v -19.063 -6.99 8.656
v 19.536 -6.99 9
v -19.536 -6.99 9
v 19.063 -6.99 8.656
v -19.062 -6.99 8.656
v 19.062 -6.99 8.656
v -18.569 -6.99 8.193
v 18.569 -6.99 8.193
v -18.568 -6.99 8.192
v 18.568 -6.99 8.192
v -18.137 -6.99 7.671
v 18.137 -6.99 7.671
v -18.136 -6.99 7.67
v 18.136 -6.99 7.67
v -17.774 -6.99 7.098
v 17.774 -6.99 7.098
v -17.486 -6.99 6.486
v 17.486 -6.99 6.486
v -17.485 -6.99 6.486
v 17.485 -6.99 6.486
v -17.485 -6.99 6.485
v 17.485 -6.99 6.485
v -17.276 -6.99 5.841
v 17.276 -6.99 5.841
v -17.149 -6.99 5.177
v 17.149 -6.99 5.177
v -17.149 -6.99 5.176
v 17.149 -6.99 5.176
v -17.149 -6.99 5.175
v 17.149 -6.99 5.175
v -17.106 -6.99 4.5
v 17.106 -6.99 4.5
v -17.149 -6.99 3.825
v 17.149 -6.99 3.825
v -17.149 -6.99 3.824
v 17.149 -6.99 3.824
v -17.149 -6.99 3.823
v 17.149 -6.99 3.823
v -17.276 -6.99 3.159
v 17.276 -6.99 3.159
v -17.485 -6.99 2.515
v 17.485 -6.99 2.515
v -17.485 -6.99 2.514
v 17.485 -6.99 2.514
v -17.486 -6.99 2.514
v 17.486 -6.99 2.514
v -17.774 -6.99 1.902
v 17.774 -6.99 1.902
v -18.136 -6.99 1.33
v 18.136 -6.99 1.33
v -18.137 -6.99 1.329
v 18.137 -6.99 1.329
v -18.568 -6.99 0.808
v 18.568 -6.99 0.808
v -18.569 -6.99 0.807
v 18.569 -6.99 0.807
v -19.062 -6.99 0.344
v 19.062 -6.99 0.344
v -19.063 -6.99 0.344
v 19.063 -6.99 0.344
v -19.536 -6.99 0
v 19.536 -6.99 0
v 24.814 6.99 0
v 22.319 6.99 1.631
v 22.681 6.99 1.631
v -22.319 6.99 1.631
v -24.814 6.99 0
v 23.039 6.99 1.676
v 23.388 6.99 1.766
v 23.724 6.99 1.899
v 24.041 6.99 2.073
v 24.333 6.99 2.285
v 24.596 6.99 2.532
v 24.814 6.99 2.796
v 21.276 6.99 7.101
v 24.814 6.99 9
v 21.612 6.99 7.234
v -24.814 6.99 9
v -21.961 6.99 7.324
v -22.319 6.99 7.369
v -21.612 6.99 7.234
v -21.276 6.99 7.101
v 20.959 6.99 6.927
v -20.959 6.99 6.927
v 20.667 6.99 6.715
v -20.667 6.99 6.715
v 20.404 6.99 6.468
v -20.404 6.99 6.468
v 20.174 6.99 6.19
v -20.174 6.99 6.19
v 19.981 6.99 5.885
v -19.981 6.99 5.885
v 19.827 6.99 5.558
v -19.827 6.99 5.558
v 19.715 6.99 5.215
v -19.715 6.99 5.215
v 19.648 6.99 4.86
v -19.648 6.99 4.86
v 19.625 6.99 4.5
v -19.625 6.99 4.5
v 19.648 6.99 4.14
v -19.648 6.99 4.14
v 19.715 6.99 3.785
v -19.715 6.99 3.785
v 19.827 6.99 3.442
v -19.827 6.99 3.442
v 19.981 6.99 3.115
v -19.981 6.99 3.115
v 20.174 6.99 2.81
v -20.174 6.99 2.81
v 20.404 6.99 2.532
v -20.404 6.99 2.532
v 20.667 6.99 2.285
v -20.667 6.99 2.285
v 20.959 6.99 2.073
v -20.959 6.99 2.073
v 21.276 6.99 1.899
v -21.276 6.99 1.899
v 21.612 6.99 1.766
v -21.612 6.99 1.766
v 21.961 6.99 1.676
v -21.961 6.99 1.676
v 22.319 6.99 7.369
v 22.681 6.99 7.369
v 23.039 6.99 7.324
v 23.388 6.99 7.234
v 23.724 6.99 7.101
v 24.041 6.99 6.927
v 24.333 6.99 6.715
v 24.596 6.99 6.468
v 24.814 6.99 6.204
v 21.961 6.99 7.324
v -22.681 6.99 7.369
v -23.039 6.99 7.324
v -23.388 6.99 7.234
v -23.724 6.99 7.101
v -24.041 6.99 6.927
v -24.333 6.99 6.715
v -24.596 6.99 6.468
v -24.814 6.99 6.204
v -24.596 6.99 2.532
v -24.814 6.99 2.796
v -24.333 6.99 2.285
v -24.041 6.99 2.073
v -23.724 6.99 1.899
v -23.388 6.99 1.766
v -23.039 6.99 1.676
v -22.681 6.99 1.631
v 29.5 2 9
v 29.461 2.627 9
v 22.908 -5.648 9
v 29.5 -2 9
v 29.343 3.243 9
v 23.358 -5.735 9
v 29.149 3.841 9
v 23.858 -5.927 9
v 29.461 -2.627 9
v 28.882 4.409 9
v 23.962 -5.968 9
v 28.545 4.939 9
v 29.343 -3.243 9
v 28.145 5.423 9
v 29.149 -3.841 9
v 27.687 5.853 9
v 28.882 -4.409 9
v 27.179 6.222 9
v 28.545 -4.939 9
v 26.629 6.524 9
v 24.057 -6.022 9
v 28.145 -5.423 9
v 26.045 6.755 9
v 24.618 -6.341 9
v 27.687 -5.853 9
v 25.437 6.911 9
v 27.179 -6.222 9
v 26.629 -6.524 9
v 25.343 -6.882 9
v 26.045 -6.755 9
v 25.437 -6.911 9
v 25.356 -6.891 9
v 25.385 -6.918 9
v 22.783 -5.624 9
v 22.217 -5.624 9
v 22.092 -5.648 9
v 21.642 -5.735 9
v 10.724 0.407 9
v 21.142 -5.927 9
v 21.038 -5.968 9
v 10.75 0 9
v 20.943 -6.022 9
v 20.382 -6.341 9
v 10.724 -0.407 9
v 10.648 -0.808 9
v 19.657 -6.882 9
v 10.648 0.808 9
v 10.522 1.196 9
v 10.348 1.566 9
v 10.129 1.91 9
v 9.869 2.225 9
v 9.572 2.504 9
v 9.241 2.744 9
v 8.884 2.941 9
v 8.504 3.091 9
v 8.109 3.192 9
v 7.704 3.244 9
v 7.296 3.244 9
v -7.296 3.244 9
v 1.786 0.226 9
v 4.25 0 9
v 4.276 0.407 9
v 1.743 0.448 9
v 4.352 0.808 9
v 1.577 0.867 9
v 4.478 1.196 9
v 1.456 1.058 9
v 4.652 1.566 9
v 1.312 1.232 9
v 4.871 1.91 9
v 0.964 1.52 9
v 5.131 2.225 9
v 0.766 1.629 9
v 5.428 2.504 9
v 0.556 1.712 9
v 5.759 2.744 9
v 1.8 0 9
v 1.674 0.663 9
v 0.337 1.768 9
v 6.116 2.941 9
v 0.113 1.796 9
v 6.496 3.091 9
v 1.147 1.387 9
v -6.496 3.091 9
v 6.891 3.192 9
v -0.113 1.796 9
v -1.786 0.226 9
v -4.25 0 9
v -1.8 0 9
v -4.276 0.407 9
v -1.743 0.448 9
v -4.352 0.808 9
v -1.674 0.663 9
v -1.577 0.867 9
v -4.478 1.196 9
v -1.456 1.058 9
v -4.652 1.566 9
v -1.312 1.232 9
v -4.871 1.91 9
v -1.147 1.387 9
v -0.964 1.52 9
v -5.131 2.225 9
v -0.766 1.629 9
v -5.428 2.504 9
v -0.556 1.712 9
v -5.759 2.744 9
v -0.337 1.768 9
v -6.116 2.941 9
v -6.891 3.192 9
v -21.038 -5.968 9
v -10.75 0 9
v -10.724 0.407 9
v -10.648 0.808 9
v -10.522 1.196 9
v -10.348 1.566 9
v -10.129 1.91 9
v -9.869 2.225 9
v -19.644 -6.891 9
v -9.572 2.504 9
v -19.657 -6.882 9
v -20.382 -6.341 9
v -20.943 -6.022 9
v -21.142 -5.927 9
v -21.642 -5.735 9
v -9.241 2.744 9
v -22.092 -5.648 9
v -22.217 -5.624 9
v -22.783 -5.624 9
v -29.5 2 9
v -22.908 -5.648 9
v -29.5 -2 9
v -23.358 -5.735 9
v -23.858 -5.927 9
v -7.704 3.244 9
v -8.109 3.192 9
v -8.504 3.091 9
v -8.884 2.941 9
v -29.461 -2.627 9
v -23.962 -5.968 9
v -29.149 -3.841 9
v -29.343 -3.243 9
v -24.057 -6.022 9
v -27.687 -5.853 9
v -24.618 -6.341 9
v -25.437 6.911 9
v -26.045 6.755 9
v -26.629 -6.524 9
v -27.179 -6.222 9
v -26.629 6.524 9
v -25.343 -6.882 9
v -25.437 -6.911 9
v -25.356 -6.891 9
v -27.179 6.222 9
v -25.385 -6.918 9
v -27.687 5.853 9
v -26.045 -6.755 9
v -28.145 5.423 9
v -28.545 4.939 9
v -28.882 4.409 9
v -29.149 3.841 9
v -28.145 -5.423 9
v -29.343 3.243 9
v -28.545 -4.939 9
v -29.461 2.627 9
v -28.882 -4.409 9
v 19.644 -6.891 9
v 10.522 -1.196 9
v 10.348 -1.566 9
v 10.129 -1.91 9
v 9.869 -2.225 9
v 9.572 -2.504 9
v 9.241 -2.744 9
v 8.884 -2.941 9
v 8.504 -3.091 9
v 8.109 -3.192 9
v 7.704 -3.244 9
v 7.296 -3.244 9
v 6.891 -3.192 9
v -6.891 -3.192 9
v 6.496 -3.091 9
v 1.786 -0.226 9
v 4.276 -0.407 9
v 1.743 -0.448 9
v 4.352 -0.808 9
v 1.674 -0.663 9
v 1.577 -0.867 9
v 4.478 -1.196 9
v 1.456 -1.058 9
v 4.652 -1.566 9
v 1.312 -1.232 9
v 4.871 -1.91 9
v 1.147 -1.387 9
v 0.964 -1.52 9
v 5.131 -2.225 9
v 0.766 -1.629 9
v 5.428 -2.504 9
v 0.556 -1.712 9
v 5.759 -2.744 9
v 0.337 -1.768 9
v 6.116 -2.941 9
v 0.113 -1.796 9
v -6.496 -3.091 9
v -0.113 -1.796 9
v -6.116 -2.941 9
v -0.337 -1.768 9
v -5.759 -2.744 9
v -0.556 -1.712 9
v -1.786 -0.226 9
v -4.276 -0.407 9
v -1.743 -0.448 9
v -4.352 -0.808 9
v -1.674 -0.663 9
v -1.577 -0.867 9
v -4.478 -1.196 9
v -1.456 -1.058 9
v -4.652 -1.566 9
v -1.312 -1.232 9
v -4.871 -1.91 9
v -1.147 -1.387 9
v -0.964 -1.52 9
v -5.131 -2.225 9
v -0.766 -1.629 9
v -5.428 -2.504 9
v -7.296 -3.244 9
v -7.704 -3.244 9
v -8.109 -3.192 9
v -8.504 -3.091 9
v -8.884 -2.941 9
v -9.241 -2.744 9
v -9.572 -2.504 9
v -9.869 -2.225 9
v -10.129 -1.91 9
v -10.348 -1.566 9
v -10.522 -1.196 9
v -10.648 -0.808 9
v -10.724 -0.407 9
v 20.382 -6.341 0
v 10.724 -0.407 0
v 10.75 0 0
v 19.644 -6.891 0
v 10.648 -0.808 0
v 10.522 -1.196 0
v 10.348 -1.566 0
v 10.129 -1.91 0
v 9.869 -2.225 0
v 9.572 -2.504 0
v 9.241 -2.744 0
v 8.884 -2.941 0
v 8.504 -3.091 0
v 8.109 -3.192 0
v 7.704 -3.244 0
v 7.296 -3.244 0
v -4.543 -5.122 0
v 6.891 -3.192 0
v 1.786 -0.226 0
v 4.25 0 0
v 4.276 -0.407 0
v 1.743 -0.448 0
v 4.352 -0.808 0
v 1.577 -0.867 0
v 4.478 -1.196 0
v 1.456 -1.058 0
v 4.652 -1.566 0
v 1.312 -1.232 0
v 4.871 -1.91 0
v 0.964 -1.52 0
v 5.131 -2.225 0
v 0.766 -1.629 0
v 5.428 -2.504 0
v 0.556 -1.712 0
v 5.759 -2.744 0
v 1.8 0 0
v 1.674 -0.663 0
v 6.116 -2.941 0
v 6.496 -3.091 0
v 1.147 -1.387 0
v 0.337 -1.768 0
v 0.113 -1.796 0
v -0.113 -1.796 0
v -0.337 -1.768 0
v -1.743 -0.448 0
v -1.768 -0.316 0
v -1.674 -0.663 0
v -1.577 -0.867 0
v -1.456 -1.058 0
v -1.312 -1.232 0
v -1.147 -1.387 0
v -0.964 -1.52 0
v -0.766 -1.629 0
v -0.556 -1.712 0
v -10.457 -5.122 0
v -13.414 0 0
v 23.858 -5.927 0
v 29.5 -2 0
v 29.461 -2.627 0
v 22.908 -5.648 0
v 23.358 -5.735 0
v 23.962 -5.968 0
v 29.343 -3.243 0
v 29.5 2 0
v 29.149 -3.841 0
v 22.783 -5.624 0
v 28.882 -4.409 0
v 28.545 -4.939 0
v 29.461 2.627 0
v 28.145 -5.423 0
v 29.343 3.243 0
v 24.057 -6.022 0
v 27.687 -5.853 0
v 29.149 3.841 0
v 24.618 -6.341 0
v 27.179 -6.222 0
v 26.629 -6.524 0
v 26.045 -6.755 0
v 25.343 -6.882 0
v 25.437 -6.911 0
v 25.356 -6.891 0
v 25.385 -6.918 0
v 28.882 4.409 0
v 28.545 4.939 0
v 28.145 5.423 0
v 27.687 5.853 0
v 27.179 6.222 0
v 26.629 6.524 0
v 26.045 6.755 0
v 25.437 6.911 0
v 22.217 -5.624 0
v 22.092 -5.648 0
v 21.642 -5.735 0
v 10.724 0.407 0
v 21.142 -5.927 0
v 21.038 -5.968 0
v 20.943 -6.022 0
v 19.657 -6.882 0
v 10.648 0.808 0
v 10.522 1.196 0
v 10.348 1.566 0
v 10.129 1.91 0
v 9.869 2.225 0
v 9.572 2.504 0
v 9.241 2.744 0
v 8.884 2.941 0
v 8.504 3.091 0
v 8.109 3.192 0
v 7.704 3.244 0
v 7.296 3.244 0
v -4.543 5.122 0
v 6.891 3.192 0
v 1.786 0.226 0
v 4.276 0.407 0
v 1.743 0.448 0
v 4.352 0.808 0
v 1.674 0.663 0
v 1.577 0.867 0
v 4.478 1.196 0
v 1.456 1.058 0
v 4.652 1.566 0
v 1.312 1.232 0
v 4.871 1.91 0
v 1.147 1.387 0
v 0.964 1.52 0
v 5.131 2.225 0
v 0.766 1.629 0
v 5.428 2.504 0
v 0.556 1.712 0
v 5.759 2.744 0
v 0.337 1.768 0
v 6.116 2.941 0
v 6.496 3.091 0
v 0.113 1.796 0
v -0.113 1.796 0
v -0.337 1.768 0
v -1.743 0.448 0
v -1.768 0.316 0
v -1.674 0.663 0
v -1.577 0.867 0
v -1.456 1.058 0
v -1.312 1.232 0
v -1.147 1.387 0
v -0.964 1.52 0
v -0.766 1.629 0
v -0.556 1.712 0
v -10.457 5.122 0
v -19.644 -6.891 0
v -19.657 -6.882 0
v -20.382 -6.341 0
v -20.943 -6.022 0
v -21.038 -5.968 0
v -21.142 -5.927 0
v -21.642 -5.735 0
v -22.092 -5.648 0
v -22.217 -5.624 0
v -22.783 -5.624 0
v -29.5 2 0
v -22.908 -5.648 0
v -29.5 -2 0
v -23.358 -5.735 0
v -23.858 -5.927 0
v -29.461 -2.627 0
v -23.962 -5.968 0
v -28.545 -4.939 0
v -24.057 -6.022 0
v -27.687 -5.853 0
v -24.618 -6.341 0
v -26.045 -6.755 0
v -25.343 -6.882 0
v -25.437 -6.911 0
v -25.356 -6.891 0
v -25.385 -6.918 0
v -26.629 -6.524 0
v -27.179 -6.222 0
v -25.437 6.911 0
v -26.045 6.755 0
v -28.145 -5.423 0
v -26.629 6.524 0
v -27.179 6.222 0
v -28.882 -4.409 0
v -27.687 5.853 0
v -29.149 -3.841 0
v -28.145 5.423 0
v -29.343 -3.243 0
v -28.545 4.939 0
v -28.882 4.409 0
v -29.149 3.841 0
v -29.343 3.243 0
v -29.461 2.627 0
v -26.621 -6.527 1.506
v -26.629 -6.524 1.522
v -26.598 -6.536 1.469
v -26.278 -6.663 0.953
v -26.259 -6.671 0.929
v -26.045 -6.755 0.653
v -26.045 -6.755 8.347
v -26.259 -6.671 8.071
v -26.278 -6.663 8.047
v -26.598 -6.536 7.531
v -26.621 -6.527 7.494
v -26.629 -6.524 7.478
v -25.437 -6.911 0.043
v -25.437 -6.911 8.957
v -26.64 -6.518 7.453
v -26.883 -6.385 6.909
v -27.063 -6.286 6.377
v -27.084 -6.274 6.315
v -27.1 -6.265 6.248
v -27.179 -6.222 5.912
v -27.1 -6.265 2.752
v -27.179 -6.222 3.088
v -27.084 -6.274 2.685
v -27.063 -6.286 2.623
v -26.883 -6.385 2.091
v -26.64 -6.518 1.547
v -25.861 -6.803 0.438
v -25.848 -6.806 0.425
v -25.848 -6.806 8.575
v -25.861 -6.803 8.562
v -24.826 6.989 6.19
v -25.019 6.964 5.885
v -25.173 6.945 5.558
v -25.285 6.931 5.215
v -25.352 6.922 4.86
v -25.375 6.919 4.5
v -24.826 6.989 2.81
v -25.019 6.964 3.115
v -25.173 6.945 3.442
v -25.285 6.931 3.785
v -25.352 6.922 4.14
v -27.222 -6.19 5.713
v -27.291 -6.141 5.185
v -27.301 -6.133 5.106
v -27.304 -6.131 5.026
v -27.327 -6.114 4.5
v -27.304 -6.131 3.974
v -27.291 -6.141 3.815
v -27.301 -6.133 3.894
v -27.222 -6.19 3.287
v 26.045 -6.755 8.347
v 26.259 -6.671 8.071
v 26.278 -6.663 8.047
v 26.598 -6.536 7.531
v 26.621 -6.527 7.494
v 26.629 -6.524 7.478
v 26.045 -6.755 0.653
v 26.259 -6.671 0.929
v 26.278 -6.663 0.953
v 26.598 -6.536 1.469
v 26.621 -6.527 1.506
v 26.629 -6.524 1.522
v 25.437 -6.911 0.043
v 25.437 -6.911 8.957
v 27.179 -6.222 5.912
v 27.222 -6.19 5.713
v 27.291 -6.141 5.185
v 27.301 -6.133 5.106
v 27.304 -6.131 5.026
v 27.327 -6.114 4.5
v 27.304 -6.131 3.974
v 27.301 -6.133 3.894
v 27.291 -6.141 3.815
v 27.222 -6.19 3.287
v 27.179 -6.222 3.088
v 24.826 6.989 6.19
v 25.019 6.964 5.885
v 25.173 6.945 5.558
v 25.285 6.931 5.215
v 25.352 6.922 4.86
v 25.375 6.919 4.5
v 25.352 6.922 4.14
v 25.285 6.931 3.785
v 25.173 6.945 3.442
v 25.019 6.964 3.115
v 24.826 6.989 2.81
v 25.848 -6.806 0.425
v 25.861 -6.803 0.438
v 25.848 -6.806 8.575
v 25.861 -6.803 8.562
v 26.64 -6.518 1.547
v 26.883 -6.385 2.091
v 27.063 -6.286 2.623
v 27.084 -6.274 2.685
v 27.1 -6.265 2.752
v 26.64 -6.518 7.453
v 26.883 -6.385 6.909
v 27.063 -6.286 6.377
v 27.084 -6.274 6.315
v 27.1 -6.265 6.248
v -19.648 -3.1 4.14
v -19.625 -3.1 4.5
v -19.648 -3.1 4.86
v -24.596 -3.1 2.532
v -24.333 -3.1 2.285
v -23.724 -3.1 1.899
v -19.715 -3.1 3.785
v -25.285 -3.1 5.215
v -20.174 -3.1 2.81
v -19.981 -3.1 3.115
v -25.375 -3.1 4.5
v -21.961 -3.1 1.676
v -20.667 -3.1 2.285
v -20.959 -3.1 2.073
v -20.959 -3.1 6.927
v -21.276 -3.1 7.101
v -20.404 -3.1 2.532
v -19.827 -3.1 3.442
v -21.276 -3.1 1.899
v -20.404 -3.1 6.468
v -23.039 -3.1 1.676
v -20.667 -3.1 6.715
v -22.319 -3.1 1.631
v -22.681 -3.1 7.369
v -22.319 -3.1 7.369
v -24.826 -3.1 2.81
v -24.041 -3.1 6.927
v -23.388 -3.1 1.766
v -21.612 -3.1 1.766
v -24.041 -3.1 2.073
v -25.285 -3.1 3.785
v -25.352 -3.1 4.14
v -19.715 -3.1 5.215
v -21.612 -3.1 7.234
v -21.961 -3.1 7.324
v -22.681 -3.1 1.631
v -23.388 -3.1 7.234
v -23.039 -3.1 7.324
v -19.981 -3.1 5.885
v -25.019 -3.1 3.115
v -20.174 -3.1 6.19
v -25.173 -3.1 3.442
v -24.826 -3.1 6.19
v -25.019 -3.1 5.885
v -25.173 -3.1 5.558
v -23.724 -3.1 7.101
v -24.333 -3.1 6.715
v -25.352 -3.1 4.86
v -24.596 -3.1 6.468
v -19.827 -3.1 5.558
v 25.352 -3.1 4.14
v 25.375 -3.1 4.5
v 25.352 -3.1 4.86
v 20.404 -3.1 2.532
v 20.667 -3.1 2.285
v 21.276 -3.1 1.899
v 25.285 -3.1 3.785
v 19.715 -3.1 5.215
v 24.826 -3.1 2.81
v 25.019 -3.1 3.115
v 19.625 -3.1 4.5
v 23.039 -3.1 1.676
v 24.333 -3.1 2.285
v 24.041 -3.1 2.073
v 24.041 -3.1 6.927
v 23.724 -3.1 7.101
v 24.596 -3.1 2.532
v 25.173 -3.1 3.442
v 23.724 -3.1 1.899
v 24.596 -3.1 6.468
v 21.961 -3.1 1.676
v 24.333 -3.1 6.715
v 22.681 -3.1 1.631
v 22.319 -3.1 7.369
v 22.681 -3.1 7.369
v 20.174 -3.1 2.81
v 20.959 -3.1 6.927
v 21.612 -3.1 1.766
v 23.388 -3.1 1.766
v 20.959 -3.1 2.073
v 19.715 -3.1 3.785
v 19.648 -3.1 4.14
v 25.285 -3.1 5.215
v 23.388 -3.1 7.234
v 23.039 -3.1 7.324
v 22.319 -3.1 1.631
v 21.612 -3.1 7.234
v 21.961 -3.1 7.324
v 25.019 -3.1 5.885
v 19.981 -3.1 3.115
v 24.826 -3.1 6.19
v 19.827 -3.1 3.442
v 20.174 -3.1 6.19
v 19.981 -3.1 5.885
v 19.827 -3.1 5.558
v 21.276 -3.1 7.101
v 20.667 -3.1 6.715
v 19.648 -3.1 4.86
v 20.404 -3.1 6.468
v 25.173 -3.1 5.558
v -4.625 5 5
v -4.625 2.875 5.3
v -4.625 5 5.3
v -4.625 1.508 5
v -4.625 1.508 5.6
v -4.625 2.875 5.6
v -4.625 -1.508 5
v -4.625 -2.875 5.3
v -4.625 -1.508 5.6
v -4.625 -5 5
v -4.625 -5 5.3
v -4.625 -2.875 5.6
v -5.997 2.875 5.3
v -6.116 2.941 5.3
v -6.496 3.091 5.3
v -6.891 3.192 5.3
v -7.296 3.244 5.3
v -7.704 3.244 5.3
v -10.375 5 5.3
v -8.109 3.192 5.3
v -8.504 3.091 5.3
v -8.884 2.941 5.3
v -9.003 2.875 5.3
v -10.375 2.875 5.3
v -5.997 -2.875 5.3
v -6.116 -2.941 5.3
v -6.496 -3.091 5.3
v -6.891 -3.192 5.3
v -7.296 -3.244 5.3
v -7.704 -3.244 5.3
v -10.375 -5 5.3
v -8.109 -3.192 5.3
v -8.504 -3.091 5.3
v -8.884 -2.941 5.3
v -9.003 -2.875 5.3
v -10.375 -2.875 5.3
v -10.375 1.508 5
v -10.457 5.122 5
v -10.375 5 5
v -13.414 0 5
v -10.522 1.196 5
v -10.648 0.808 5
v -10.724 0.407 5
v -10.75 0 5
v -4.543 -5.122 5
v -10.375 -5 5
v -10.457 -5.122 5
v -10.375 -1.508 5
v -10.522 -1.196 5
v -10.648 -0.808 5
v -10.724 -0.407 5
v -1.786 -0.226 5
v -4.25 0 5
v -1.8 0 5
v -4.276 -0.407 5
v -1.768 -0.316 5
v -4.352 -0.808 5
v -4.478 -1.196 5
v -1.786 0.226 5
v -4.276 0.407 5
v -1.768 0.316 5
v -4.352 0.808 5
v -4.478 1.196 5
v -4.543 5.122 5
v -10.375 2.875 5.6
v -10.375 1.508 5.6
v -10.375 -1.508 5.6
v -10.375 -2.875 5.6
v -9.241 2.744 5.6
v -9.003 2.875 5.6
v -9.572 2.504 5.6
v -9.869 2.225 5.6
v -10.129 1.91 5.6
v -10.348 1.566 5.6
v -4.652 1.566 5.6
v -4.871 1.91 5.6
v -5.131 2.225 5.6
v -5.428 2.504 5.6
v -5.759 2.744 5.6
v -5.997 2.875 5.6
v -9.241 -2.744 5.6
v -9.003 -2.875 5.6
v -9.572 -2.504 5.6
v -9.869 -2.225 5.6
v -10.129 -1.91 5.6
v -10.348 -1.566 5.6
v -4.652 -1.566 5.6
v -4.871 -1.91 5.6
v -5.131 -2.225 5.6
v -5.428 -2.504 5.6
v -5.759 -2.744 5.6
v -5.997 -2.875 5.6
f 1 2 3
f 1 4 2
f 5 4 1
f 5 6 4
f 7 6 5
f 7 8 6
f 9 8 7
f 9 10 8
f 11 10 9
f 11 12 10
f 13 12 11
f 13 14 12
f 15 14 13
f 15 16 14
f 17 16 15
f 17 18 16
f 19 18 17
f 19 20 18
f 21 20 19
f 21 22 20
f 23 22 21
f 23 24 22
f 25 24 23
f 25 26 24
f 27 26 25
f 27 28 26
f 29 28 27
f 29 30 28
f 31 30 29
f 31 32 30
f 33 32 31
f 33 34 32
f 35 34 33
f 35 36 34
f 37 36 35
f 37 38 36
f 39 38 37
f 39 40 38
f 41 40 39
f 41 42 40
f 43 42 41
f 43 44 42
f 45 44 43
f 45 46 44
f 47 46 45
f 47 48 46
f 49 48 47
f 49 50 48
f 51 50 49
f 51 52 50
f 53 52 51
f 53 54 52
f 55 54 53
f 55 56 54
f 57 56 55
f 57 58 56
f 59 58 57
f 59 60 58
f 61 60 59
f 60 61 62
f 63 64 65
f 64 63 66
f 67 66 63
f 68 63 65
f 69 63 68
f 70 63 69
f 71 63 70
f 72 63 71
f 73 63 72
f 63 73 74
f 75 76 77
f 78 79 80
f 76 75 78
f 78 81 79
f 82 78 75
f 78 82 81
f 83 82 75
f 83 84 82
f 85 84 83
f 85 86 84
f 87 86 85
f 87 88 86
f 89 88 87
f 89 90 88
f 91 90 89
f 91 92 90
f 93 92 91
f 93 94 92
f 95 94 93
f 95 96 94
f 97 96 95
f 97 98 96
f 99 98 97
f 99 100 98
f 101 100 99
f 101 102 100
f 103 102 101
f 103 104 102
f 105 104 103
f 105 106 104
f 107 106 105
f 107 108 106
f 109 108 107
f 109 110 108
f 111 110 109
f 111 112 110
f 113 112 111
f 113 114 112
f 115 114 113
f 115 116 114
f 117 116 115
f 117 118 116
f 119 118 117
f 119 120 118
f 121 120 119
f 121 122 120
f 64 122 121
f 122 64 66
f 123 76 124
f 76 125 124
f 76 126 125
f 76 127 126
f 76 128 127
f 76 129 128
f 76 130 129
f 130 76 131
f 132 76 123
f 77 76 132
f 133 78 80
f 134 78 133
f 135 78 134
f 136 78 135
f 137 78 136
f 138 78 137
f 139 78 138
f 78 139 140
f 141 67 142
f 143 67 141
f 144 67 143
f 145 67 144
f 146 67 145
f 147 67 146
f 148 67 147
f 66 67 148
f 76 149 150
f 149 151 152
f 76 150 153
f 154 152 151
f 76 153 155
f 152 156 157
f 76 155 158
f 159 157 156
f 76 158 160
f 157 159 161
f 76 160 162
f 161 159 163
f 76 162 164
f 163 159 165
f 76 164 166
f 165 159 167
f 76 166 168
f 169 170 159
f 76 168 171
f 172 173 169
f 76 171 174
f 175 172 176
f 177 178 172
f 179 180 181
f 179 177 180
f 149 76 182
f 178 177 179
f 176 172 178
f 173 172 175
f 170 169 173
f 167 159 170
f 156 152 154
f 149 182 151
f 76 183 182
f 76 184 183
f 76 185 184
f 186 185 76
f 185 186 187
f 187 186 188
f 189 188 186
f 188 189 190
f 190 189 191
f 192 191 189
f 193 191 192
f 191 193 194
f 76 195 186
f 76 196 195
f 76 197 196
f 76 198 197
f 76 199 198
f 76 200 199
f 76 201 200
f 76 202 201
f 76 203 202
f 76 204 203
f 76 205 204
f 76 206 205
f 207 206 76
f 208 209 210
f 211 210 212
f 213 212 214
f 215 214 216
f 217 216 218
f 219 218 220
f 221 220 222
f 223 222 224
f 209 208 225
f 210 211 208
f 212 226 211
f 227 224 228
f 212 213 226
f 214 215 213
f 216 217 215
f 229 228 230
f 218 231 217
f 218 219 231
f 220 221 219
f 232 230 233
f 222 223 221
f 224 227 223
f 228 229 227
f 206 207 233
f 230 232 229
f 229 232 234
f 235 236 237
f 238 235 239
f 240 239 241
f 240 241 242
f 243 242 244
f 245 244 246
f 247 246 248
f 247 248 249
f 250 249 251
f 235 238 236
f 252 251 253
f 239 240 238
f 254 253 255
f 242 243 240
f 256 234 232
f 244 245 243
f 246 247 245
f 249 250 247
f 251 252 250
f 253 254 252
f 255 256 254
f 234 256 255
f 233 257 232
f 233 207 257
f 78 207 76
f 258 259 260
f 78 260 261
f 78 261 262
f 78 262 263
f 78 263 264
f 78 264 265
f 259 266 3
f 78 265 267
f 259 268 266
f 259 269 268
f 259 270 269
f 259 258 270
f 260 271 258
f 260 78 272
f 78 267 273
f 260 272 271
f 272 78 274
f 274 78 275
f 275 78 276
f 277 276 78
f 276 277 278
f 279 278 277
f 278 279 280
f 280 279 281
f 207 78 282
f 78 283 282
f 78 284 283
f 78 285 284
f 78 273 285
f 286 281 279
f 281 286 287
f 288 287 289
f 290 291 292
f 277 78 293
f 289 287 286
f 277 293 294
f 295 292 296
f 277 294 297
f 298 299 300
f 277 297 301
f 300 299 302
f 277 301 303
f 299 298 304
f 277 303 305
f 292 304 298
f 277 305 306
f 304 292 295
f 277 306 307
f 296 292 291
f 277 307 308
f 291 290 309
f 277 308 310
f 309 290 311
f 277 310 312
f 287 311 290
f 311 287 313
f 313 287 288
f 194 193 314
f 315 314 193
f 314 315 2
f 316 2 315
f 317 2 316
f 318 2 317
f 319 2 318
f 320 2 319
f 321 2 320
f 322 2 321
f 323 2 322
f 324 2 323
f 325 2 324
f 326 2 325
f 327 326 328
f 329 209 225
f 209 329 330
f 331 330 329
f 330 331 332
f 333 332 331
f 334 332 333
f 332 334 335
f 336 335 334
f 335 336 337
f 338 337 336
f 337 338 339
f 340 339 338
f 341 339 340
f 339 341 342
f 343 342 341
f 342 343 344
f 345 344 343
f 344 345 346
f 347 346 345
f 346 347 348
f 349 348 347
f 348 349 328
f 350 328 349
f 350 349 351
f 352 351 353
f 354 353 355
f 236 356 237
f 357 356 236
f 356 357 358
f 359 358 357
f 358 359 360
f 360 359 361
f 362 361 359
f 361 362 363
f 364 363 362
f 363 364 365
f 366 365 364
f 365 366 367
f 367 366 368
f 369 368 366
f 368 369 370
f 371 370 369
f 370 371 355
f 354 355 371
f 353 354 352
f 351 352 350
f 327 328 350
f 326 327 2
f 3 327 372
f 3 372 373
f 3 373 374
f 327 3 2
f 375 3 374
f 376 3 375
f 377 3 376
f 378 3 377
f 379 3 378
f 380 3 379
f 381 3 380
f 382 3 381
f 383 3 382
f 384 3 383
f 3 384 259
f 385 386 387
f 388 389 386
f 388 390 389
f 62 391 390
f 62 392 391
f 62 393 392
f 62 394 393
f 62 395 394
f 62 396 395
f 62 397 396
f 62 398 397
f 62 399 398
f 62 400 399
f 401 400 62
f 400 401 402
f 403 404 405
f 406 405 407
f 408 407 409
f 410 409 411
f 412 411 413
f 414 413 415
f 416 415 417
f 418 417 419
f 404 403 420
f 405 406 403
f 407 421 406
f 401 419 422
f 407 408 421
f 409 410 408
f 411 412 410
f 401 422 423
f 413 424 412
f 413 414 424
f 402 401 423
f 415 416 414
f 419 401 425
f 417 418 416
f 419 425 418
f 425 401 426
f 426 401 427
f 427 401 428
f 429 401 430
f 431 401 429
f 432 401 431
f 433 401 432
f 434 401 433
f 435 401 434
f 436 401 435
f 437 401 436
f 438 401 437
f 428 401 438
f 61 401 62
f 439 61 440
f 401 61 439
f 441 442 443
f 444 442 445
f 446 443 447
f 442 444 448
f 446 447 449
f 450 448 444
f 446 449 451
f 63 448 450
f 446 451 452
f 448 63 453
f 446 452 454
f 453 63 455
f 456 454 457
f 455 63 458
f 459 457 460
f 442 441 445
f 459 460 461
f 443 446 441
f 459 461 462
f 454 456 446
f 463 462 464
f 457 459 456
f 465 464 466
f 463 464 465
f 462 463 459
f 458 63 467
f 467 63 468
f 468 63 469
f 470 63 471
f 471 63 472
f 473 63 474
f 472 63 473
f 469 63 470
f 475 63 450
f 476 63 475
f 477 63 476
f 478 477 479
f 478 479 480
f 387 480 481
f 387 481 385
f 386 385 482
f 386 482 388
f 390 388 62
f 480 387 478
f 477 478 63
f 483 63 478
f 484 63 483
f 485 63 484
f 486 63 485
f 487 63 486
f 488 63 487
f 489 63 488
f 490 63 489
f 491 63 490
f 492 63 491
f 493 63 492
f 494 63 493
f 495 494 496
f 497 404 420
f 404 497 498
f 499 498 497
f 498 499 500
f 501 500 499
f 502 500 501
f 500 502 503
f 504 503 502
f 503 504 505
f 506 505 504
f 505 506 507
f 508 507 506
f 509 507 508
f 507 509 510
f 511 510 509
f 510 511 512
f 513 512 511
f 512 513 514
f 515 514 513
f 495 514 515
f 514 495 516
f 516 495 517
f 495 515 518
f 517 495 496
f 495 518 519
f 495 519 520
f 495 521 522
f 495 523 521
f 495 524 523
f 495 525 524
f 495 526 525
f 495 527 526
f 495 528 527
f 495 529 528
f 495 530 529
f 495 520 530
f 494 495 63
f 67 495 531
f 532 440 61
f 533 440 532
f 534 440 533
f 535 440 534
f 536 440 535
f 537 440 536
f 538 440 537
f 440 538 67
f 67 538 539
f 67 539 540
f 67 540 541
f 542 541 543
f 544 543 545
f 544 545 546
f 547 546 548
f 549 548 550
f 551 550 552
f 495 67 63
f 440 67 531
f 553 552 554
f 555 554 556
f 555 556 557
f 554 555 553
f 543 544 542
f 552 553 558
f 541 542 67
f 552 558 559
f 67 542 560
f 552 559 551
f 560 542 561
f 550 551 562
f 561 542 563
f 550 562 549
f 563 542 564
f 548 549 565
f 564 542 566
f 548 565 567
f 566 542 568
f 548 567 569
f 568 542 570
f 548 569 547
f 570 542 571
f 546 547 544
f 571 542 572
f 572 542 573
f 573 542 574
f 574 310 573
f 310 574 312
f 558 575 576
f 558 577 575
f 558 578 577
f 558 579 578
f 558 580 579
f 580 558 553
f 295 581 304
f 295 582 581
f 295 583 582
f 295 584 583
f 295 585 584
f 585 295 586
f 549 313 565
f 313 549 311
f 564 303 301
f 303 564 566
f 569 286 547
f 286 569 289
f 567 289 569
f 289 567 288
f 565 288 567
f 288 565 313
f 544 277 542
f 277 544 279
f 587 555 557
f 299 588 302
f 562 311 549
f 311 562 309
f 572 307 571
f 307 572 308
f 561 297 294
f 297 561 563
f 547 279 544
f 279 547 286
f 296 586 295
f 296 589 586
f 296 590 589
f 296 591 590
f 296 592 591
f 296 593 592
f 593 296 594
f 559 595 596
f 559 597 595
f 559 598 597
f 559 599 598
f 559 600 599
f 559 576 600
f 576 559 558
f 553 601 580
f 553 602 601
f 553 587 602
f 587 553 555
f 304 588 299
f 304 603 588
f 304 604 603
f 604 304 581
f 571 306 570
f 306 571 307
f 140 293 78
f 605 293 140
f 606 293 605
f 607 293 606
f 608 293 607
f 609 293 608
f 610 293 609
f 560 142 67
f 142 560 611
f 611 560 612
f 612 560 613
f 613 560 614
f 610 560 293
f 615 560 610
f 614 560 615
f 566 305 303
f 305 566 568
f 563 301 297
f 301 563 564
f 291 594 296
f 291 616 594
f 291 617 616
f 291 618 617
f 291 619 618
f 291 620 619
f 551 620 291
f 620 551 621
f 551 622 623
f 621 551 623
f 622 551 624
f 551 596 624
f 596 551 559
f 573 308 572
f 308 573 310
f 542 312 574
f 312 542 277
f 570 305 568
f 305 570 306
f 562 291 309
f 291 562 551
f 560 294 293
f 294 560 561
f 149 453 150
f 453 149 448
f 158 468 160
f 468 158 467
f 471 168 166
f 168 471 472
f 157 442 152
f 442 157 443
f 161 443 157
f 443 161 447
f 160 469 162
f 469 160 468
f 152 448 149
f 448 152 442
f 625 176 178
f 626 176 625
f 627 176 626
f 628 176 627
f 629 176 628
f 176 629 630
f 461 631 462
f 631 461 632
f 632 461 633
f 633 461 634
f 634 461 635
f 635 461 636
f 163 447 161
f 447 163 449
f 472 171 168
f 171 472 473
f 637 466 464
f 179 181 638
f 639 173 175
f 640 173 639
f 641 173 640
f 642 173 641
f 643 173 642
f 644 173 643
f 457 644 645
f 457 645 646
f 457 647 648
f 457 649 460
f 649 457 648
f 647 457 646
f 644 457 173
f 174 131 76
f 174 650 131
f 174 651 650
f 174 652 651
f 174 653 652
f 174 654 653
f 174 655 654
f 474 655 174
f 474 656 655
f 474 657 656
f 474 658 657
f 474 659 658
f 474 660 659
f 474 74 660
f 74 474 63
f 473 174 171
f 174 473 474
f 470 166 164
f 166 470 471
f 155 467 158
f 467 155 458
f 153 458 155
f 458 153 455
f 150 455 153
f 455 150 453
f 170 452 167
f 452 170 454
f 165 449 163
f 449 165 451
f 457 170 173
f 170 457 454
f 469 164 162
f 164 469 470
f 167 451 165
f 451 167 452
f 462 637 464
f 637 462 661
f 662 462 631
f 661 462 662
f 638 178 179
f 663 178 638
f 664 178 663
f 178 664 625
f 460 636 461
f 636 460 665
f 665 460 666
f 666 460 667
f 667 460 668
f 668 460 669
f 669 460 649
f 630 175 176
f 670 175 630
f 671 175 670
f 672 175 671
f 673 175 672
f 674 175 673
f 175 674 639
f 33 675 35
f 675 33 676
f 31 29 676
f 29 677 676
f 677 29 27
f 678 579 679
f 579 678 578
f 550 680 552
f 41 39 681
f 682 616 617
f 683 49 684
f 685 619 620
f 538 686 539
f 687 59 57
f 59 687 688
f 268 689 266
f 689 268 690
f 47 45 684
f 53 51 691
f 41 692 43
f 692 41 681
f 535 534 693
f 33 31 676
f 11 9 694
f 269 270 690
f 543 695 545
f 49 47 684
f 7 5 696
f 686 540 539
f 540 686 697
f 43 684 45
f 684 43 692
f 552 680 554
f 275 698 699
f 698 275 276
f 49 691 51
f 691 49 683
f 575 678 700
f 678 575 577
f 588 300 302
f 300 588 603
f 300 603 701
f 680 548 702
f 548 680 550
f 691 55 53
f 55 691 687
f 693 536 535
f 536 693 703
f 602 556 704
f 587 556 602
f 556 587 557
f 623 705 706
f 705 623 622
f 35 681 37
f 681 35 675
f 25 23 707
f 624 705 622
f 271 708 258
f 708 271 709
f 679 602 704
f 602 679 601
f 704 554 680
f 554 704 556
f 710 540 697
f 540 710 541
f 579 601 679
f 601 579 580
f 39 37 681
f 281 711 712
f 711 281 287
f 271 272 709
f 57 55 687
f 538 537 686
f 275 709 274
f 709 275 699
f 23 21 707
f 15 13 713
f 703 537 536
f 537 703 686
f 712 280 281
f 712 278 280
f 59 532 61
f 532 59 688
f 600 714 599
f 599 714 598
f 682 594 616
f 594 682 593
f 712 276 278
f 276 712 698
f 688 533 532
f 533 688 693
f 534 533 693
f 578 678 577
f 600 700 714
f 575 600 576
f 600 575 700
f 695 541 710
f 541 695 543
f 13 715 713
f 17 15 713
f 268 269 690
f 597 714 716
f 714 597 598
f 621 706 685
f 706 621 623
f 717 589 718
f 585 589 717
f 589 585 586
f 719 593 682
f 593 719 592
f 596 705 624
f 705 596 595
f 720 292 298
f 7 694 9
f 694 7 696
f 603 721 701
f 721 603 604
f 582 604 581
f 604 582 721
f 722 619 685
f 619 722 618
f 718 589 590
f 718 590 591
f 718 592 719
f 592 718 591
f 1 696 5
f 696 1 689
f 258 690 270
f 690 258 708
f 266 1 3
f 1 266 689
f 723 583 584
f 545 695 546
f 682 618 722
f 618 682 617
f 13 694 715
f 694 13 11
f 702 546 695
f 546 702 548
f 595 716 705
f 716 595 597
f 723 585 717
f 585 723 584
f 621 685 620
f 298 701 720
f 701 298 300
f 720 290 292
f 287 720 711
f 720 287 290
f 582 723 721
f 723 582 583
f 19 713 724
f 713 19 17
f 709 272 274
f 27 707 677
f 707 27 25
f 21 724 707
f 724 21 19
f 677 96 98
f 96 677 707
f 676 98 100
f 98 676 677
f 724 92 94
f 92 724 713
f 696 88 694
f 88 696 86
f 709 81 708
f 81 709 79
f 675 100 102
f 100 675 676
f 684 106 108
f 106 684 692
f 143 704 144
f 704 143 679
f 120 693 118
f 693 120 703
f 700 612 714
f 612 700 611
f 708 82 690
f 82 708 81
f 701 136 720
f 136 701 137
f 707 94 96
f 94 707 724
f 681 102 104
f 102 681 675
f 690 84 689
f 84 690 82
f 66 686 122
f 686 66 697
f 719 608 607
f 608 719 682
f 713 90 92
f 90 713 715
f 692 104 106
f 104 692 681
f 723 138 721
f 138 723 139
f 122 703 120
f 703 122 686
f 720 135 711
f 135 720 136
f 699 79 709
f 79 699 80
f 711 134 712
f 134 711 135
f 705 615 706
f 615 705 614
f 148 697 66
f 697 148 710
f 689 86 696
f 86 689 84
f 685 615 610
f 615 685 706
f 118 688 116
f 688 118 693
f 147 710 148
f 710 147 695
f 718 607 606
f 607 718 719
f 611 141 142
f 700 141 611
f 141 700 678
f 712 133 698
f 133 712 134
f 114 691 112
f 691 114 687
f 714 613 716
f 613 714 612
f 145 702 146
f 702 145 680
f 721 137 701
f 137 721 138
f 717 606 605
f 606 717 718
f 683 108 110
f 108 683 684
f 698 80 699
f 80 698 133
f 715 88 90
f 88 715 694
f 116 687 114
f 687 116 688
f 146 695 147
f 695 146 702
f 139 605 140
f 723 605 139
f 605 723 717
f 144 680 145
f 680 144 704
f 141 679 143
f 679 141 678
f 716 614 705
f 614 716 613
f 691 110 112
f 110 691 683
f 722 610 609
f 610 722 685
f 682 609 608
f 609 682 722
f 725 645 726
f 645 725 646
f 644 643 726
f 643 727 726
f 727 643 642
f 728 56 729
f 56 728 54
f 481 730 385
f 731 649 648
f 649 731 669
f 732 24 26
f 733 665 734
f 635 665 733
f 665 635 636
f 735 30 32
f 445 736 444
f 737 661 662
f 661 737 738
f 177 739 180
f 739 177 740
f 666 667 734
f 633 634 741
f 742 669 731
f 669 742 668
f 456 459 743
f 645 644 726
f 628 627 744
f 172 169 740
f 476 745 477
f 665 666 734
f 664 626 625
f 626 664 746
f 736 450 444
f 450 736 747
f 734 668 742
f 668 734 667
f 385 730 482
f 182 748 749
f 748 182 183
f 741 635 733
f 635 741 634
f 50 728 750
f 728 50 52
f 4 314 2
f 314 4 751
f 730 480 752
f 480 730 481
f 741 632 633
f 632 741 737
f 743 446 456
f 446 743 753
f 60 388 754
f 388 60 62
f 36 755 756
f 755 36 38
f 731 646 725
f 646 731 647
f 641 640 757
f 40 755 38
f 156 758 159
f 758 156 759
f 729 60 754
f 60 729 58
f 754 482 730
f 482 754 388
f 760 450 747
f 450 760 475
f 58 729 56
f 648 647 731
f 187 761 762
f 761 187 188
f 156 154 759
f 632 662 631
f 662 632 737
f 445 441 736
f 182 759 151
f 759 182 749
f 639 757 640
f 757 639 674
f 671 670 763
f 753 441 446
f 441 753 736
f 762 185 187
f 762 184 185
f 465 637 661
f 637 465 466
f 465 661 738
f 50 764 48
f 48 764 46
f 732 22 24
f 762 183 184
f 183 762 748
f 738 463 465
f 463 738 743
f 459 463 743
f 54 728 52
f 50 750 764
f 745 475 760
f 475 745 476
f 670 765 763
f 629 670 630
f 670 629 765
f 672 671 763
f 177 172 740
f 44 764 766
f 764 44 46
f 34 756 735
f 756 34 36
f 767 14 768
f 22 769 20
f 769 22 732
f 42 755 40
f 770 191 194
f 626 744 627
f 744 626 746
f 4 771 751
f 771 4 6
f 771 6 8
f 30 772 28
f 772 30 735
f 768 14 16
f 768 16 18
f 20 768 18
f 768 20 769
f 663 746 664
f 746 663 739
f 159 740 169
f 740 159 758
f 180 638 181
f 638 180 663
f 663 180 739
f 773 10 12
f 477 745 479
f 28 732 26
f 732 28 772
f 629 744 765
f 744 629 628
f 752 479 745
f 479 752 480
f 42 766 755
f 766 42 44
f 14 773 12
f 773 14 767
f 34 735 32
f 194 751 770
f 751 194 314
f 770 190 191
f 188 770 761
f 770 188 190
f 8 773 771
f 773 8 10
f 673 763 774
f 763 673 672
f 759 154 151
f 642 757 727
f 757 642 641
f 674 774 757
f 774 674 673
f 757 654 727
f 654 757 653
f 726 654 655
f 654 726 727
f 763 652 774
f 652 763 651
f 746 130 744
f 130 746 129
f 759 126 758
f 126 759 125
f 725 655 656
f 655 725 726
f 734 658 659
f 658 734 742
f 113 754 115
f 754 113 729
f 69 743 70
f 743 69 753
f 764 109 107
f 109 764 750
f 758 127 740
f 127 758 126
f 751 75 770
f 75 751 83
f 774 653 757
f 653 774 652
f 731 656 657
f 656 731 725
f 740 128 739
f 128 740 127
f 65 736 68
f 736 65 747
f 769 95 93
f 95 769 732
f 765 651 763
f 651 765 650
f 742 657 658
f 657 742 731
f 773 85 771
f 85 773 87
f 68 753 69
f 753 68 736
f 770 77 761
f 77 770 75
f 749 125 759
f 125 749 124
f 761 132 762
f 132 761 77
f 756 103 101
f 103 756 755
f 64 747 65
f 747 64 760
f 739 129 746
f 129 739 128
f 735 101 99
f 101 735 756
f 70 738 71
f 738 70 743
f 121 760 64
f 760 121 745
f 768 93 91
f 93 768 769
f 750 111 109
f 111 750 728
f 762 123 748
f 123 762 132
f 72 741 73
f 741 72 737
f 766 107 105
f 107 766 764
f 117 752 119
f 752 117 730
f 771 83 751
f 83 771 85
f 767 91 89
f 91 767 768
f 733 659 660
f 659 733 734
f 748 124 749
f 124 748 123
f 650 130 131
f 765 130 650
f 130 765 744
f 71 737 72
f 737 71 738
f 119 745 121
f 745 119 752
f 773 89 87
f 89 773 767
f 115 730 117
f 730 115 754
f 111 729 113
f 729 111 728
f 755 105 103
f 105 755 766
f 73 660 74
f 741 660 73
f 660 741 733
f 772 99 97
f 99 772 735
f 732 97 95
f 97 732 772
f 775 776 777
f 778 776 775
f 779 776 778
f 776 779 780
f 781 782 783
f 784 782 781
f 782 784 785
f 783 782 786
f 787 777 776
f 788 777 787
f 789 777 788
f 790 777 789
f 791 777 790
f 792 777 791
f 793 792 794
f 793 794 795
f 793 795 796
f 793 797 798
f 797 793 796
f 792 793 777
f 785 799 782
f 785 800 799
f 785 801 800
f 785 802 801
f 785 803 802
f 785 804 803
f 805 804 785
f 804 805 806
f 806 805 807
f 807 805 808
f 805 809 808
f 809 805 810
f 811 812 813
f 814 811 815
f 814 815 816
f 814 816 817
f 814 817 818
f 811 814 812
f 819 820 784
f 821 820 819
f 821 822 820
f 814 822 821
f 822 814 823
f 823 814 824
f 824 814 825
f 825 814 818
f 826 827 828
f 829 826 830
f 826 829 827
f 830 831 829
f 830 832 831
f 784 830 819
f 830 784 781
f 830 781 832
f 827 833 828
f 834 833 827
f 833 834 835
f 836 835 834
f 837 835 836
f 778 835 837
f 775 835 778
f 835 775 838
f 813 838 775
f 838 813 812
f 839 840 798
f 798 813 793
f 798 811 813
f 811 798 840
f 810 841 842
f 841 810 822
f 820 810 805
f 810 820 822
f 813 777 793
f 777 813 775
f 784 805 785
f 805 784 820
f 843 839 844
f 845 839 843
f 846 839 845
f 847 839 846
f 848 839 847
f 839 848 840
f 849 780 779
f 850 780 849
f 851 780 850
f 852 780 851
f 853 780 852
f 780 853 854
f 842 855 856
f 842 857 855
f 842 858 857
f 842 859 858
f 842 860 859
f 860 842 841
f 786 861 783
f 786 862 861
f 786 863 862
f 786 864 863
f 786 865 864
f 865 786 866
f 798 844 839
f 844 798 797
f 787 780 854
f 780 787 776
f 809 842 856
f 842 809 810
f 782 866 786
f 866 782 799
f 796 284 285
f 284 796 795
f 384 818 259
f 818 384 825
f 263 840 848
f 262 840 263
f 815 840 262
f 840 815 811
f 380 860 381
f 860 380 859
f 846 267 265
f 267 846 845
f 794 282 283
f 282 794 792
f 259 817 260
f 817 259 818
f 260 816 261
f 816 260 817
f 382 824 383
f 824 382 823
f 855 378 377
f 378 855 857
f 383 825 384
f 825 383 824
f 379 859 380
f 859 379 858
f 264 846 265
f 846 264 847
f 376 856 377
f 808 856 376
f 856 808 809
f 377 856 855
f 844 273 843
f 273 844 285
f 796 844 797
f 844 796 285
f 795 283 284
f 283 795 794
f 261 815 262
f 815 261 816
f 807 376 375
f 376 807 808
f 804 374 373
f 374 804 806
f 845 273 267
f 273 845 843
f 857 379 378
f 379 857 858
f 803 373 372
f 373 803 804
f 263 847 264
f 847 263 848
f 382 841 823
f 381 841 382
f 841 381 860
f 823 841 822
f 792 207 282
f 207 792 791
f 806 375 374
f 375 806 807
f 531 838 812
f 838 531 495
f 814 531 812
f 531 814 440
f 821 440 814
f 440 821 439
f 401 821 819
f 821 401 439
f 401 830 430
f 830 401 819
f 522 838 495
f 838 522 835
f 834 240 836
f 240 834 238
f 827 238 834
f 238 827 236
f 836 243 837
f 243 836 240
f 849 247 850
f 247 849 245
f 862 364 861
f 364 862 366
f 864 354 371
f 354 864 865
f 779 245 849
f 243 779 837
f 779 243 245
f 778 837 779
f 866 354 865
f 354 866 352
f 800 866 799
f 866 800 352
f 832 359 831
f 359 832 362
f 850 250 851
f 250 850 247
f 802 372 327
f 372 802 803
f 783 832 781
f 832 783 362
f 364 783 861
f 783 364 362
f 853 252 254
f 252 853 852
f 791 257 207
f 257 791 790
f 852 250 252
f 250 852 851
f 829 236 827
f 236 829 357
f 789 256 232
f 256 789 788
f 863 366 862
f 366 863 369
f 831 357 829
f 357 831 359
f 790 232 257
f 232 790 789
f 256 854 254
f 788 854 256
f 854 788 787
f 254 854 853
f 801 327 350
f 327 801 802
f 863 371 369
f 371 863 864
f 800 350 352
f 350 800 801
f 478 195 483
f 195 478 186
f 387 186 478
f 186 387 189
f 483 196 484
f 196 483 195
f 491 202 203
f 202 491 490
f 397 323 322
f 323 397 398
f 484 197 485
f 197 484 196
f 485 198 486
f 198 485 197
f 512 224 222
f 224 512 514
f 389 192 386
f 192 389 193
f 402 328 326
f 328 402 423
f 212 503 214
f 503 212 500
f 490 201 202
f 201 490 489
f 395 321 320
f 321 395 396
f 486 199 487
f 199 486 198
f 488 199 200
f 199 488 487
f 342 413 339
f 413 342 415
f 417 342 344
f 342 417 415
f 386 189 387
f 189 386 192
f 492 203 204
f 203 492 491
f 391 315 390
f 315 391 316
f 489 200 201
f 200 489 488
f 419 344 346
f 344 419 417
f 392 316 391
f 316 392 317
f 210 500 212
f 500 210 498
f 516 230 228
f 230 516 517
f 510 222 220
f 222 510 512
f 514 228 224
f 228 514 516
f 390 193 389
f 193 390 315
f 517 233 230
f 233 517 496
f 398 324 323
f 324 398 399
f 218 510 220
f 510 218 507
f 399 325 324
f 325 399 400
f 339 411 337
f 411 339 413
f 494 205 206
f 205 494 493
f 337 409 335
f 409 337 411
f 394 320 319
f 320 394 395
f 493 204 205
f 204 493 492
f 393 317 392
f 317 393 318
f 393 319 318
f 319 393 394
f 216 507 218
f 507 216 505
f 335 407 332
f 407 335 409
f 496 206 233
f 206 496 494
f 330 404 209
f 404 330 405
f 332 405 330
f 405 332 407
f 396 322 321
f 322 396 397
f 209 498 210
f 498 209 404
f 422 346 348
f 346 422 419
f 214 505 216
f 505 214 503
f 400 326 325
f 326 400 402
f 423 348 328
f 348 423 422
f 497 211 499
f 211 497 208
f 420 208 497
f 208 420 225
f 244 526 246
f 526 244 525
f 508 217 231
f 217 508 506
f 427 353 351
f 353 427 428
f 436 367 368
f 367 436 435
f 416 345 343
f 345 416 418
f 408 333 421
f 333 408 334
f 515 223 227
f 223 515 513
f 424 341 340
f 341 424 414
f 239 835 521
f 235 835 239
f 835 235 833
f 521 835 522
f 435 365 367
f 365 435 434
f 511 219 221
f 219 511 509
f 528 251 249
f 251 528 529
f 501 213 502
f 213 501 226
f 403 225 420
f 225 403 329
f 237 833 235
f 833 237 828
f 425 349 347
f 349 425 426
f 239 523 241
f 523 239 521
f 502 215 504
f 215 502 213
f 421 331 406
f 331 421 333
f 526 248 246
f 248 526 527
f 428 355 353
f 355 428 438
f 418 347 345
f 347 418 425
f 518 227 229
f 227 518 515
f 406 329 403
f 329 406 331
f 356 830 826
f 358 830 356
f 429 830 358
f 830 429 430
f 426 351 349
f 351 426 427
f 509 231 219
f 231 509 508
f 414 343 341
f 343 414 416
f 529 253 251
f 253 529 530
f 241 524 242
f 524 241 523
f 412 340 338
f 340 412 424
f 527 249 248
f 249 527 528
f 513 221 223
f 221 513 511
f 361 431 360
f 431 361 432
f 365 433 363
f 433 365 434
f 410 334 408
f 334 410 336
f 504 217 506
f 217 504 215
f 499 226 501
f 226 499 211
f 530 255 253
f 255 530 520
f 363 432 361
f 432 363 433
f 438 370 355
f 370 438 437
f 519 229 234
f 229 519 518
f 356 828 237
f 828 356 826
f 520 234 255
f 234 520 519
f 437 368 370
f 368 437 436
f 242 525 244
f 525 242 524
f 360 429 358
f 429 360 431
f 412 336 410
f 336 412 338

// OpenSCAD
$fn = 50;


difference() {
	union() {
		hull() {
			translate(v = [-9.5000000000, 2.0000000000, 0]) {
				cylinder(h = 9, r = 5);
			}
			translate(v = [9.5000000000, 2.0000000000, 0]) {
				cylinder(h = 9, r = 5);
			}
			translate(v = [-9.5000000000, -2.0000000000, 0]) {
				cylinder(h = 9, r = 5);
			}
			translate(v = [9.5000000000, -2.0000000000, 0]) {
				cylinder(h = 9, r = 5);
			}
		}
		translate(v = [-15.0000000000, 0.0000000000, 0]) {
			hull() {
				translate(v = [-9.5000000000, 2.0000000000, 0]) {
					cylinder(h = 9, r = 5);
				}
				translate(v = [9.5000000000, 2.0000000000, 0]) {
					cylinder(h = 9, r = 5);
				}
				translate(v = [-9.5000000000, -2.0000000000, 0]) {
					cylinder(h = 9, r = 5);
				}
				translate(v = [9.5000000000, -2.0000000000, 0]) {
					cylinder(h = 9, r = 5);
				}
			}
		}
		translate(v = [15.0000000000, 0.0000000000, 0]) {
			hull() {
				translate(v = [-9.5000000000, 2.0000000000, 0]) {
					cylinder(h = 9, r = 5);
				}
				translate(v = [9.5000000000, 2.0000000000, 0]) {
					cylinder(h = 9, r = 5);
				}
				translate(v = [-9.5000000000, -2.0000000000, 0]) {
					cylinder(h = 9, r = 5);
				}
				translate(v = [9.5000000000, -2.0000000000, 0]) {
					cylinder(h = 9, r = 5);
				}
			}
		}
	}
	union() {
		translate(v = [-22.5000000000, -7.0000000000, 4.5000000000]) {
			rotate(a = [90, 0, 0]) {
				difference() {
					union() {
						#translate(v = [0, 0, -14.0000000000]) {
							cylinder(h = 14, r = 2.6000000000);
						}
						#translate(v = [0, 0, -3.9000000000]) {
							cylinder(h = 3.9000000000, r1 = 2.8750000000, r2 = 5.4000000000);
						}
						#translate(v = [0, 0, -14.0000000000]) {
							cylinder(h = 14, r = 2.8750000000);
						}
						#translate(v = [0, 0, -14.0000000000]) {
							cylinder(h = 14, r = 2.6000000000);
						}
					}
					union();
				}
			}
		}
		translate(v = [22.5000000000, -7.0000000000, 4.5000000000]) {
			rotate(a = [90, 0, 0]) {
				difference() {
					union() {
						#translate(v = [0, 0, -14.0000000000]) {
							cylinder(h = 14, r = 2.6000000000);
						}
						#translate(v = [0, 0, -3.9000000000]) {
							cylinder(h = 3.9000000000, r1 = 2.8750000000, r2 = 5.4000000000);
						}
						#translate(v = [0, 0, -14.0000000000]) {
							cylinder(h = 14, r = 2.8750000000);
						}
						#translate(v = [0, 0, -14.0000000000]) {
							cylinder(h = 14, r = 2.6000000000);
						}
					}
					union();
				}
			}
		}
		translate(v = [-7.5000000000, 0.0000000000, 0]) {
			rotate(a = [0, 0, 0]) {
				difference() {
					union() {
						#translate(v = [-2.8750000000, -5.0000000000, -0.3000000000]) {
							cube(size = [5.7500000000, 10, 0.3000000000]);
						}
						#translate(v = [-2.8750000000, -2.8750000000, -0.6000000000]) {
							cube(size = [5.7500000000, 5.7500000000, 0.3000000000]);
						}
						#translate(v = [-2.8750000000, -5.0000000000, 5]) {
							cube(size = [5.7500000000, 10, 0.3000000000]);
						}
						#translate(v = [-2.8750000000, -2.8750000000, 5.3000000000]) {
							cube(size = [5.7500000000, 5.7500000000, 0.3000000000]);
						}
						#translate(v = [0, 0, -100.0000000000]) {
							cylinder(h = 200, r = 3.2500000000);
						}
						#linear_extrude(height = 5) {
							polygon(points = [[5.9142500000, 0.0000000000], [2.9571250000, 5.1218907443], [-2.9571250000, 5.1218907443], [-5.9142500000, 0.0000000000], [-2.9571250000, -5.1218907443], [2.9571250000, -5.1218907443]]);
						}
						#translate(v = [-2.8750000000, -5.0000000000, -0.3000000000]) {
							cube(size = [5.7500000000, 10, 0.3000000000]);
						}
						#translate(v = [-2.8750000000, -2.8750000000, -0.6000000000]) {
							cube(size = [5.7500000000, 5.7500000000, 0.3000000000]);
						}
						#translate(v = [-2.8750000000, -5.0000000000, 5]) {
							cube(size = [5.7500000000, 10, 0.3000000000]);
						}
						#translate(v = [-2.8750000000, -2.8750000000, 5.3000000000]) {
							cube(size = [5.7500000000, 5.7500000000, 0.3000000000]);
						}
						#translate(v = [0, 0, -100.0000000000]) {
							cylinder(h = 200, r = 3.2500000000);
						}
						#translate(v = [-2.8750000000, -5.0000000000, -0.3000000000]) {
							cube(size = [5.7500000000, 10, 0.3000000000]);
						}
						#translate(v = [-2.8750000000, -2.8750000000, -0.6000000000]) {
							cube(size = [5.7500000000, 5.7500000000, 0.3000000000]);
						}
						#translate(v = [-2.8750000000, -5.0000000000, 5]) {
							cube(size = [5.7500000000, 10, 0.3000000000]);
						}
						#translate(v = [-2.8750000000, -2.8750000000, 5.3000000000]) {
							cube(size = [5.7500000000, 5.7500000000, 0.3000000000]);
						}
						#translate(v = [0, 0, -100.0000000000]) {
							cylinder(h = 200, r = 3.2500000000);
						}
					}
					union();
				}
			}
		}
		translate(v = [-7.5000000000, 0.0000000000, 0]) {
			translate(v = [0, 0, -100]) {
				cylinder(h = 200, r = 3.2500000000);
			}
		}
		translate(v = [7.5000000000, 0.0000000000, 0]) {
			translate(v = [0, 0, -100]) {
				cylinder(h = 200, r = 3.2500000000);
			}
		}
		translate(v = [-7.5000000000, 0.0000000000, 0]) {
			translate(v = [0, 0, -100]) {
				cylinder(h = 200, r = 1.8000000000);
			}
		}
		translate(v = [0, 0, -100]) {
			cylinder(h = 200, r = 1.8000000000);
		}
		translate(v = [7.5000000000, 0.0000000000, 0]) {
			translate(v = [0, 0, -100]) {
				cylinder(h = 200, r = 1.8000000000);
			}
		}
	}
}
